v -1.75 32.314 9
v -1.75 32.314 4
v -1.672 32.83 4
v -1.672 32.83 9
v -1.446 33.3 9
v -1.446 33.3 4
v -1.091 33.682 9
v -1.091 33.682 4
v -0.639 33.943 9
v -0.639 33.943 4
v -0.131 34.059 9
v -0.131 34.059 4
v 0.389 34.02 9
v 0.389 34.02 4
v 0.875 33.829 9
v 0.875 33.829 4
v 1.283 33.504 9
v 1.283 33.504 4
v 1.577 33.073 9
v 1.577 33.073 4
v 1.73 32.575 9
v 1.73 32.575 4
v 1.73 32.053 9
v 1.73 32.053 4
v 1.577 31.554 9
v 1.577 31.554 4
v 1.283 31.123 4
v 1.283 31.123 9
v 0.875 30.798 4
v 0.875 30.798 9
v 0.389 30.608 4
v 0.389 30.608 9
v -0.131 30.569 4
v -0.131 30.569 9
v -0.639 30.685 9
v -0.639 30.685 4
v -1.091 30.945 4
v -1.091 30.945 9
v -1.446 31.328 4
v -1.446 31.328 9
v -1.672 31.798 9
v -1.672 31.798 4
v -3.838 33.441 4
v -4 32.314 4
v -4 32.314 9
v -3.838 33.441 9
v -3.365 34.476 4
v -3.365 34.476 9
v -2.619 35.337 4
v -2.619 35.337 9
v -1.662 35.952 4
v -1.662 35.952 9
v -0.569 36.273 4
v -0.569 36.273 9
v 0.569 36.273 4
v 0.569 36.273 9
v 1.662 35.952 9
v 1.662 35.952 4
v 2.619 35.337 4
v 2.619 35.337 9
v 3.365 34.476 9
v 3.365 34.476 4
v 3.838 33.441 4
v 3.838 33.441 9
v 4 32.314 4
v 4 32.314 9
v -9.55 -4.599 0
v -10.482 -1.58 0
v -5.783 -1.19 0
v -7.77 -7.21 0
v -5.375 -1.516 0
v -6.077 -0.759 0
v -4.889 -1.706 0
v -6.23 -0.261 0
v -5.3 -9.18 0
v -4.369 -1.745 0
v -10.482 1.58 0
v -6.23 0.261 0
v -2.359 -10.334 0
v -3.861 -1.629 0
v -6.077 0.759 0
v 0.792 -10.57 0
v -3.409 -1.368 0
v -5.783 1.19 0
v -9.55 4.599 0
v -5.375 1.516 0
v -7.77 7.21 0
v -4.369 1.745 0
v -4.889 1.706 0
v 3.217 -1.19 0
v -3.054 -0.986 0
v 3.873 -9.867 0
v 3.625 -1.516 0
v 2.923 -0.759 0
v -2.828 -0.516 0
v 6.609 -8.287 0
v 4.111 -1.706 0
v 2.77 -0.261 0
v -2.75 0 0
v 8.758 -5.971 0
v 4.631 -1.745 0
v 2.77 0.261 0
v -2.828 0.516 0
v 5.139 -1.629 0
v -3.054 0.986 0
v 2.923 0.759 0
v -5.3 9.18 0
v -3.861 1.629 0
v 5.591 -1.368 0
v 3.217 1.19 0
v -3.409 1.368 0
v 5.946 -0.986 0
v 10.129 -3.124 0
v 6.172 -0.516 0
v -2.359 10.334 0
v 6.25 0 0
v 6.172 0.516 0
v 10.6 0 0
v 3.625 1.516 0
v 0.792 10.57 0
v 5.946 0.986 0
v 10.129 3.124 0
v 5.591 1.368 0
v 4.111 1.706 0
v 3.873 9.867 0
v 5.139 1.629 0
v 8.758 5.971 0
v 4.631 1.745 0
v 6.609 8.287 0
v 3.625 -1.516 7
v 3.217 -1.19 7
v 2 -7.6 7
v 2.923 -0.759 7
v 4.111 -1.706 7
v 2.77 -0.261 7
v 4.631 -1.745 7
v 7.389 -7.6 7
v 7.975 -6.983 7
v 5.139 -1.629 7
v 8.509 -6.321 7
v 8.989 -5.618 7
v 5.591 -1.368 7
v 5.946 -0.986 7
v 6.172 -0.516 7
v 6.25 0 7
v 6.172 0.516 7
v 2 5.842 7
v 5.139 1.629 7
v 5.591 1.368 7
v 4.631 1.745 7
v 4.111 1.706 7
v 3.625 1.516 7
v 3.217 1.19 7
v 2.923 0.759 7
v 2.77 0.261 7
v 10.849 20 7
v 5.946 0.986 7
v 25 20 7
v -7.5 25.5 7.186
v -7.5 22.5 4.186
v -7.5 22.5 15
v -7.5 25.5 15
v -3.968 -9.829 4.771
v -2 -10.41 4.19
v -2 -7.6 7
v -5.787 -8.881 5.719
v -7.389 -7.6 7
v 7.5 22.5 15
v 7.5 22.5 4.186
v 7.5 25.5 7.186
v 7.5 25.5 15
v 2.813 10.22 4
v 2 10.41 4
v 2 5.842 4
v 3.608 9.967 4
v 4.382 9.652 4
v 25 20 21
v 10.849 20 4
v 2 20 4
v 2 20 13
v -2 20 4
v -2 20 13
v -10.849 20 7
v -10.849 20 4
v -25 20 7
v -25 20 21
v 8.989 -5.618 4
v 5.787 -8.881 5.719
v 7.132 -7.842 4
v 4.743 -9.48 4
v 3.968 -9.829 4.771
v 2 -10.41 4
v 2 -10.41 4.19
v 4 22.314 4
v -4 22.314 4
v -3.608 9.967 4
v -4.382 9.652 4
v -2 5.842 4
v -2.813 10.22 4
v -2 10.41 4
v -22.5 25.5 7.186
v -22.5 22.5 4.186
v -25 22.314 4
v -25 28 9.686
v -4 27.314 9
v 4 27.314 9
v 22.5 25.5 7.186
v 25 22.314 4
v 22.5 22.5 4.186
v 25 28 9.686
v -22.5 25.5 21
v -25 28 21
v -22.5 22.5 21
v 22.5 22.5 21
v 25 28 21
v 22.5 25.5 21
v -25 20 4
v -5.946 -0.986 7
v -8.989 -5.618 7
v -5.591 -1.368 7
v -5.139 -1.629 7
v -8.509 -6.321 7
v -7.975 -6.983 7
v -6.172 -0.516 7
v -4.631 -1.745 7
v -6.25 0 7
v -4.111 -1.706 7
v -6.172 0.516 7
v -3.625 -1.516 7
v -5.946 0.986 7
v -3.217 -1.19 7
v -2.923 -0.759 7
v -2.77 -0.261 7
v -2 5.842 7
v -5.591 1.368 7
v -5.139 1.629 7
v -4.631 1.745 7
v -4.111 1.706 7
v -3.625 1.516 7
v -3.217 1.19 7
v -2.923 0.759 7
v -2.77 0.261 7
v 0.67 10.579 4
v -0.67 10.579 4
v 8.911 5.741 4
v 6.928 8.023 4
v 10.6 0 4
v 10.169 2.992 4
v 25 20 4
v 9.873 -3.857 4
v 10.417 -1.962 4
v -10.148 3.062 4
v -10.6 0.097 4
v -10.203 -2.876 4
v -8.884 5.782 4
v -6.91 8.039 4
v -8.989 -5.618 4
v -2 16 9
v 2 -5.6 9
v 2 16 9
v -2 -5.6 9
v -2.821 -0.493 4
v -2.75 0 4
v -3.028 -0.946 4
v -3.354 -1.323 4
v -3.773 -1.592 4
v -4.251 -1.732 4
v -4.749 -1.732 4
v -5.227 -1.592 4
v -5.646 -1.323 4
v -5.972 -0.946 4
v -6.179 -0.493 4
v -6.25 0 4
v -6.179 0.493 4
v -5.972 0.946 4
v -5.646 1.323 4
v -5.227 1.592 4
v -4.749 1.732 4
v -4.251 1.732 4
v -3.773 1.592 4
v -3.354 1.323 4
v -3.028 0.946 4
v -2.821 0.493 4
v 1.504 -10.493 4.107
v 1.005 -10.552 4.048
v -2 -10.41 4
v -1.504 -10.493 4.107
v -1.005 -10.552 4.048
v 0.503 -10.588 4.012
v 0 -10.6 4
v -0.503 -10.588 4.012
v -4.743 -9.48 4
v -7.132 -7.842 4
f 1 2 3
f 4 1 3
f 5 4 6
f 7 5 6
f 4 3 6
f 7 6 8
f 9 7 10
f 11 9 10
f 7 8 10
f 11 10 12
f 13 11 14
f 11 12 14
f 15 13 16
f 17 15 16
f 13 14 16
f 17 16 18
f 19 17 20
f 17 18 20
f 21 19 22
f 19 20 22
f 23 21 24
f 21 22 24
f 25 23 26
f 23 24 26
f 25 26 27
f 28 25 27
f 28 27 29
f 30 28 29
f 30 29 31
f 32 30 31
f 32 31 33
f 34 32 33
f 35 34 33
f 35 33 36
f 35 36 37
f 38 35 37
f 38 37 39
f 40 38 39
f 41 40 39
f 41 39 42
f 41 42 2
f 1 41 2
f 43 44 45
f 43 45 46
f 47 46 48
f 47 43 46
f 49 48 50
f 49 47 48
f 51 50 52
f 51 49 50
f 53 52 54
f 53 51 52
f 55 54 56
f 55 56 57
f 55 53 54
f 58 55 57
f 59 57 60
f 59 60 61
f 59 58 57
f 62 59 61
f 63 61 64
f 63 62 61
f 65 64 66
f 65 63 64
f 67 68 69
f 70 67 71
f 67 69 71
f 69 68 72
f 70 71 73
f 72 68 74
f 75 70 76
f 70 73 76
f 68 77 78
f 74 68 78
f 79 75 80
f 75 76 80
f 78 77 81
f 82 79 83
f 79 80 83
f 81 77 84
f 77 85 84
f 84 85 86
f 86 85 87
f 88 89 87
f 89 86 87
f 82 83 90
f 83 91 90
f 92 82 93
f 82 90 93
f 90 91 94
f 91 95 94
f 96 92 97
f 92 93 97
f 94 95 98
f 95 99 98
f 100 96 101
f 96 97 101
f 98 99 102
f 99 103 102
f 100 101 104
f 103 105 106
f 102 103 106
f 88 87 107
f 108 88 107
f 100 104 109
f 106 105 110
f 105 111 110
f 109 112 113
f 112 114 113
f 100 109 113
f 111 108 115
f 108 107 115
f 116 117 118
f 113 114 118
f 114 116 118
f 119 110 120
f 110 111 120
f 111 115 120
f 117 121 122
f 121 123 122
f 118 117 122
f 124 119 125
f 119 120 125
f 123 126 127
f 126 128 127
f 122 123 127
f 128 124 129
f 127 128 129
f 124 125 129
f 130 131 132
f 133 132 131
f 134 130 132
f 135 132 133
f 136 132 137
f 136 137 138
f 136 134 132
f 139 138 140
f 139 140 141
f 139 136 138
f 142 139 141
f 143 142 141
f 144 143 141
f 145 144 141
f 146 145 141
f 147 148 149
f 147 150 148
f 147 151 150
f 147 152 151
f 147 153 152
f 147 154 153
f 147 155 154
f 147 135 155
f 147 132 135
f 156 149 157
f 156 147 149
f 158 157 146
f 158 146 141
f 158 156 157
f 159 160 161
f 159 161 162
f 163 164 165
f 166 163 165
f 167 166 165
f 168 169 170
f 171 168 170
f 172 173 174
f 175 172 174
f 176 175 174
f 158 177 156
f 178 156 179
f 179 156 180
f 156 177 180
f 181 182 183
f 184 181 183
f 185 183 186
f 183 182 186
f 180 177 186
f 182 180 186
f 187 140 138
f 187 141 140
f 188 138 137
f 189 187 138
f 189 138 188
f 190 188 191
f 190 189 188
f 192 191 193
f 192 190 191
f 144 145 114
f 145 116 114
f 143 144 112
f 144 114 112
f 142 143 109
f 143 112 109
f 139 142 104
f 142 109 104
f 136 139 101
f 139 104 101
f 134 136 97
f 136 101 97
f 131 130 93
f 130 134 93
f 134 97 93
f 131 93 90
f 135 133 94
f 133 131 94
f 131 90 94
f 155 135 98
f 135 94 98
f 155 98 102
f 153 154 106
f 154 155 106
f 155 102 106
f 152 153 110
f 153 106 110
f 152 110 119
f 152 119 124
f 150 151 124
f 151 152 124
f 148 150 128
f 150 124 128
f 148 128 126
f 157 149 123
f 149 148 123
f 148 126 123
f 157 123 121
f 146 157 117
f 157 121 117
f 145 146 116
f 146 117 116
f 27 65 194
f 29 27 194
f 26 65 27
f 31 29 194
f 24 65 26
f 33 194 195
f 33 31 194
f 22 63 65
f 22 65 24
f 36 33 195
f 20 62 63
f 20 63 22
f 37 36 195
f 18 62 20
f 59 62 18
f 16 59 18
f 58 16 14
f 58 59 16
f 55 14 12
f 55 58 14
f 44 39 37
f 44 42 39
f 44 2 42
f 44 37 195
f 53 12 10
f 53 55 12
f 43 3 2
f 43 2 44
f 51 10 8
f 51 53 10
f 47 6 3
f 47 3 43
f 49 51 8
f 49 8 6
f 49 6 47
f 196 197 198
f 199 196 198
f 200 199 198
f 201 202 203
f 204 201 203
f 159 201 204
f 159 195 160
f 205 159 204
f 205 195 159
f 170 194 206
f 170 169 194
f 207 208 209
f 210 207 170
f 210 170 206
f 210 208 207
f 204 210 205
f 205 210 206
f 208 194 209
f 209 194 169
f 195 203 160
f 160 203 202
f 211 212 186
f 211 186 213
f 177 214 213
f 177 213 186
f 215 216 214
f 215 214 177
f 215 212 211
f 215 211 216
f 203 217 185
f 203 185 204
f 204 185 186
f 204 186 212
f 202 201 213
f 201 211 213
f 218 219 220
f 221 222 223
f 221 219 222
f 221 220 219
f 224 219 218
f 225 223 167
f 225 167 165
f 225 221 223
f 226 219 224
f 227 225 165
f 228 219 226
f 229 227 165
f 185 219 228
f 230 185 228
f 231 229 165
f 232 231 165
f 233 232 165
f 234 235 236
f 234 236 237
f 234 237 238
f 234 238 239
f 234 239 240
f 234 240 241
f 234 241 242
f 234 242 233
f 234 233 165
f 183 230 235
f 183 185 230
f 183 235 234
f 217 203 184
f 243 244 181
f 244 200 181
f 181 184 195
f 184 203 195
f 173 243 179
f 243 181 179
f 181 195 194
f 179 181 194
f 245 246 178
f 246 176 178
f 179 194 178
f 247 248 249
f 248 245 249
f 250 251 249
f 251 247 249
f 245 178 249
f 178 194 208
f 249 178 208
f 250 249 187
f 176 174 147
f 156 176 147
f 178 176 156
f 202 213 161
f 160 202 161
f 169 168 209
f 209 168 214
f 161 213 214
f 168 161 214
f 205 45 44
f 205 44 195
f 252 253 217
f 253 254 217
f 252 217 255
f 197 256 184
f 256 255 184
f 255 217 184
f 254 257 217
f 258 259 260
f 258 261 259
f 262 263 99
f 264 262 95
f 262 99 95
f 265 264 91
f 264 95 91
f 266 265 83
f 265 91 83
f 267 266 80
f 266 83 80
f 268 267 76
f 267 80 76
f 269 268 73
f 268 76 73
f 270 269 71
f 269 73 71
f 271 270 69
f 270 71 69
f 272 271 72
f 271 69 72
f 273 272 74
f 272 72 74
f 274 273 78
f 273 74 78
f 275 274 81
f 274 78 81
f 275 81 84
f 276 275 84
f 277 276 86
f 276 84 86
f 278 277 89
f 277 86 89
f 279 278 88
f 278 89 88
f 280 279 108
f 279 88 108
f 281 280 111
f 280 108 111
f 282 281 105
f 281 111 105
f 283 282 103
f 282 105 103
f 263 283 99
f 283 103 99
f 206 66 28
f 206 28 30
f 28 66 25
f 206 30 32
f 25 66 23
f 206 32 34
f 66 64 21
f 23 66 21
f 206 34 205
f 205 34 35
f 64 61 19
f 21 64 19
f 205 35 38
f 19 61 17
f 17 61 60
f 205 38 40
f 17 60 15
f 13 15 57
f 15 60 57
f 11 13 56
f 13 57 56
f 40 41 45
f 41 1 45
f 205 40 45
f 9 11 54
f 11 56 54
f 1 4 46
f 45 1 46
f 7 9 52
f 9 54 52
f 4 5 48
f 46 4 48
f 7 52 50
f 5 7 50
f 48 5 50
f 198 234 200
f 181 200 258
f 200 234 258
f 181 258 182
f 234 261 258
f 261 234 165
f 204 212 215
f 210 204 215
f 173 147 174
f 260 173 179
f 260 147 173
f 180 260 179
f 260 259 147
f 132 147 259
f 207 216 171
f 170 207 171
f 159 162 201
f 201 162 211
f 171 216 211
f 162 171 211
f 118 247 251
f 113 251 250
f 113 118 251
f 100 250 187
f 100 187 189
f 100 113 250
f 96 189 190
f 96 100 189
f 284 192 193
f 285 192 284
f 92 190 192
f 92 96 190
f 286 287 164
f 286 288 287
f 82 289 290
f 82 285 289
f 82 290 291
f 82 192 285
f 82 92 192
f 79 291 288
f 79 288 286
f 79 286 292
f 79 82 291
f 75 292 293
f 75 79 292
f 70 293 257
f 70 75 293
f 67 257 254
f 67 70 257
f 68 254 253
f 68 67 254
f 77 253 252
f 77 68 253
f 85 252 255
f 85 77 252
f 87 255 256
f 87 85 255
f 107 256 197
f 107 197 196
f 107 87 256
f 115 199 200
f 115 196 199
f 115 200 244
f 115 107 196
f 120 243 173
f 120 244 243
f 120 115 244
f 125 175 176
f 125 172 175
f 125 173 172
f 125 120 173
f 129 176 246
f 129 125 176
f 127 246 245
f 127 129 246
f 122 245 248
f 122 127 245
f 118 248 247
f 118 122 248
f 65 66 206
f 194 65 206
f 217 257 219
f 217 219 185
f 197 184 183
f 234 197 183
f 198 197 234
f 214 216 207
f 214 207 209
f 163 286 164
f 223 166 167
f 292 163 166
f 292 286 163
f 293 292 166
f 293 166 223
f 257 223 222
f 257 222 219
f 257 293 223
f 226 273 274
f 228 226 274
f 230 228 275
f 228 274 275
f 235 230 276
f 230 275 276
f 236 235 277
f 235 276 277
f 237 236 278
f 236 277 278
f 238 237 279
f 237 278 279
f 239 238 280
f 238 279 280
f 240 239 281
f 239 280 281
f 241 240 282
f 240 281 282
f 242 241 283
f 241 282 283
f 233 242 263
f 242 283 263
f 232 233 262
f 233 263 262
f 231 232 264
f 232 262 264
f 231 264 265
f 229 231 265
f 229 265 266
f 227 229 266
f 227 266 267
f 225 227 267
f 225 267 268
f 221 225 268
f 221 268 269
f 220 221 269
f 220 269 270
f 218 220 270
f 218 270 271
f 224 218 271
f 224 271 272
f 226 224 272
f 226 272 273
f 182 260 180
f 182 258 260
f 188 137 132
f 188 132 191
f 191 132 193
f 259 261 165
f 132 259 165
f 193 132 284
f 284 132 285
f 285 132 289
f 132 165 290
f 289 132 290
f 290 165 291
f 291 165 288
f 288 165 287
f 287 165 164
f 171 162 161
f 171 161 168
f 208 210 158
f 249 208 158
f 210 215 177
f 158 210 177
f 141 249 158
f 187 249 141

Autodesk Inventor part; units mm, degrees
ref_plane "YZ Plane" through (0, 0, 0) normal (1, 0, 0) x (0, 1, 0)
ref_plane "XZ Plane" through (0, 0, 0) normal (0, 1, 0) x (-1, 0, 0)
ref_plane "XY Plane" through (0, 0, 0) normal (0, 0, 1) x (1, 0, 0)
sketch "Sketch1" plane through (0, 0, 0) normal (0, 0, 1) x (1, 0, 0)
  circle A0 centre (4.5, 0) radius 2.2 projected
  circle A1 centre (-4.5, 0) radius 2.2 projected
  circle A2 centre (0, 0) radius 10.6 projected
  circle A3 centre (4.5, 0) radius 1.75
  circle A4 centre (-4.5, 0) radius 1.75
  point P0 (0, 0)
  dimension "d0" = 3.5
  dimension "d1" = 3.5
extrude "Extrusion1" add sketch "Sketch1" along normal blind 4 contours A0 | A1 | A2
sketch "Sketch2" plane through (0, 0, 0) normal (1, 0, 0) x (0, 1, 0)
  line L0 (10.6, 4) -> (-10.6, 4) projected
  line L1 (-10.6, 4) -> (-5.6, 9)
  line L2 (-5.6, 9) -> (16, 9)
  line L3 (16, 9) -> (20, 13)
  line L4 (20, 13) -> (20, 21)
  line L5 (20, 21) -> (28, 21)
  line L6 (28, 21) -> (28, 4)
  line L7 (28, 4) -> (10.6, 4)
  line L8 (28, 9.6863) -> (22.3137, 4)
  line L9 (28, 9.6863) -> (36.0416, 9.6863) construction
  point P0 (0, 0)
  point P1 (0, 4)
  dimension "d4" = 135
  dimension "d5" = 5
  dimension "d6" = 45
  dimension "d7" = 8
  dimension "d8" = 8
  dimension "d9" = 4
  dimension "d10" = 8
  dimension "d11" = 20
extrude "Extrusion2" add sketch "Sketch2" along normal mid plane 4 contours L0 L1 L2 L3 L4 L5 L6 L8 L7
sketch "Sketch3" plane through (2, -10.6, 4) normal (0, 0, -1) x (-1, 0, 0)
  circle A0 centre (2, 10.6) radius 10.6 projected
  line L0 (4, 0) -> (2, 0) projected
  line L1 (2, 0) -> (0, 0) projected
  line L2 (0, 5) -> (0, 0) projected
  line L3 (4, 5) -> (0, 5) projected
  line L4 (4, 0) -> (4, 5) projected
  point P0 (2, 10.6)
  point P1 (0, 0.1904)
  point P2 (4, 0.1904)
extrude "Extrusion3" cut sketch "Sketch3" against normal through all contours A0 L1 L2 | L4 L0 A0
sketch "Sketch4" plane through (-2, 20, 21) normal (0, 0, 1) x (1, 0, 0)
  line L0 (4, 0) -> (0, 0) projected
  line L1 (4, 8) -> (4, 0) construction
  line L2 (0, 8) -> (4, 8) projected
  line L3 (0, 0) -> (0, 8) construction
  line L4 (0, 8) -> (4, 8) projected
  line L5 (2, 8) -> (2, 0)
  line L6 (0, 0) -> (4, 0) projected
  line L7 (-23, 8) -> (27, 8)
  line L8 (27, 8) -> (27, 0)
  line L9 (27, 0) -> (-23, 0)
  line L10 (-23, 0) -> (-23, 8)
  line L11 (-23, 8) -> (27, 0) construction
  line L12 (27, 8) -> (-23, 0) construction
  point P0 (2, -20)
  point P1 (2, 4)
  dimension "d16" = 50
extrude "Extrusion4" add sketch "Sketch4" against normal up to surface surface through (0, 22.3137, 4) normal (0, 0.7071, -0.7071)
sketch "Sketch5" plane through (25, 20, 21) normal (1, 0, 0) x (0, 0, -1)
  line L0 (17, -9.5904) -> (17, 0) projected
  line L1 (19.3137, 0) -> (11.3137, 8) projected
  line L2 (0, 8) -> (11.3137, 8) projected
  line L3 (0, 0) -> (0, 8) projected
  line L4 (0, 0) -> (19.3137, 0) projected
  line L5 (17, 0) -> (17, 2.3137)
  line L6 (11.3137, 8) -> (19.3137, 0) projected
  point P0 (21, -20)
extrude "Extrusion5" cut sketch "Sketch5" against normal through all contours L4 L5 L1
sketch "Sketch6" plane through (25, 20, 21) normal (0, 0, 1) x (1, 0, 0)
  line L0 (0, 0) -> (-50, 0) projected
  line L1 (0, 0) -> (0, 8) projected
  line L2 (-50, 8) -> (0, 8) projected
  line L3 (-50, 8) -> (-50, 0) projected
  line L4 (0, 0) -> (0, 8) projected
  line L5 (0, 4) -> (-50, 4) construction
  line L6 (-50, 8) -> (-50, 0) projected
  line L7 (-50, 8) -> (0, 8) projected
  line L8 (-25, 8) -> (-25, 0) construction
  line L9 (-27, 0) -> (-23, 0) projected
  line L10 (-17.5, 5.5) -> (-2.5, 5.5)
  line L11 (-2.5, 5.5) -> (-2.5, 2.5)
  line L12 (-2.5, 2.5) -> (-17.5, 2.5)
  line L13 (-17.5, 2.5) -> (-17.5, 5.5)
  line L14 (-17.5, 5.5) -> (-2.5, 2.5) construction
  line L15 (-2.5, 5.5) -> (-17.5, 2.5) construction
  line L16 (-32.5, 5.5) -> (-47.5, 5.5)
  line L17 (-47.5, 5.5) -> (-47.5, 2.5)
  line L18 (-47.5, 2.5) -> (-32.5, 2.5)
  line L19 (-32.5, 2.5) -> (-32.5, 5.5)
  point P0 (-25, -20)
  point P1 (-10, 4)
  dimension "d21" = 15
  dimension "d22" = 3
  dimension "d23" = 2.5
extrude "Extrusion6" cut sketch "Sketch6" against normal through all contours L10 L11 L12 L13 | L19 L18 L17 L16
sketch "Sketch7" plane through (25, 20, 21) normal (0, 0, 1) x (1, 0, 0)
  line L0 (-17.5, 2.5) -> (-17.5, 5.5) projected
  line L1 (-32.5, 5.5) -> (-32.5, 2.5) projected
  line L2 (-17.5, 5.5) -> (-32.5, 5.5)
  line L3 (-32.5, 5.5) -> (-32.5, 2.5)
  line L4 (-32.5, 2.5) -> (-17.5, 2.5)
  line L5 (-17.5, 2.5) -> (-17.5, 5.5)
  point P0 (-25, -20)
extrude "Extrusion7" cut sketch "Sketch7" against normal blind 6
sketch "Sketch8" plane through (0, 0, 4) normal (0, 0, 1) x (1, 0, 0)
  circle A0 centre (4.5, 0) radius 1.75 projected
  line L0 (2, 10.4096) -> (2, -10.4096) projected
  line L1 (2, 20) -> (25, 20) projected
  line L2 (25, 20) -> (8.9888, -5.618)
  arc A1 (2, -10.4096) -> (2, 10.4096) centre (0, 0) ccw projected
  line L3 (2, 5.8415) -> (10.849, 20)
  arc A2 (-2, -10.4096) -> (2, -10.4096) centre (0, 0) ccw projected
  line L4 (0, -10.6) -> (0, 30.6147)
  line L5 (-25, 20) -> (-8.9888, -5.618)
  line L6 (-2, 5.8415) -> (-10.849, 20)
  arc A3 (-2, 10.4096) -> (-2, -10.4096) centre (0, 0) ccw projected
  line L7 (-13.7579, -10.035) -> (-3.7579, -10.035) projected
  line L8 (-25, 20) -> (-2, 20) projected
  point P0 (0, 0)
  dimension "d29" = 12
extrude "Extrusion8" add sketch "Sketch8" along normal blind 3 contours L3 A1 L0 | L3 L1 L2 A1 picked at (5.0326, 4.687)
sketch "Sketch9" plane through (2, -10.4096, 7) normal (-1, 0, 0) x (0, 0, 1)
  line L0 (0, 2.8096) -> (-2.8096, 0) projected
  line L1 (-2.8096, 0) -> (0, 0) projected
  line L2 (0, 2.8096) -> (0, 0) projected
  point P0 (-7, 10.4096)
extrude "Extrusion9" cut sketch "Sketch9" against normal through all
mirror "Mirror1" about plane through (0, 0, 0) normal (1, 0, 0) of "Extrusion8", "Extrusion9"
sketch "Sketch10" plane through (0, 0, 4) normal (0, 0, -1) x (-1, 0, 0)
  circle A0 centre (0, 32.3137) radius 1.75
  circle A1 centre (0, 32.3137) radius 4
  line L0 (-4, 32.3137) -> (-4, 22.3137)
  line L1 (-25, 22.3137) -> (25, 22.3137) projected
  line L2 (0, 22.3137) -> (0, 32.3137) construction
  line L3 (4, 32.3137) -> (4, 22.3137)
  point P0 (0, 0)
  dimension "d36" = 8
  dimension "d34" = 3.5
  dimension "d35" = 10
extrude "Extrusion10" add sketch "Sketch10" against normal blind 5
properties part number "Lazercutlink"
